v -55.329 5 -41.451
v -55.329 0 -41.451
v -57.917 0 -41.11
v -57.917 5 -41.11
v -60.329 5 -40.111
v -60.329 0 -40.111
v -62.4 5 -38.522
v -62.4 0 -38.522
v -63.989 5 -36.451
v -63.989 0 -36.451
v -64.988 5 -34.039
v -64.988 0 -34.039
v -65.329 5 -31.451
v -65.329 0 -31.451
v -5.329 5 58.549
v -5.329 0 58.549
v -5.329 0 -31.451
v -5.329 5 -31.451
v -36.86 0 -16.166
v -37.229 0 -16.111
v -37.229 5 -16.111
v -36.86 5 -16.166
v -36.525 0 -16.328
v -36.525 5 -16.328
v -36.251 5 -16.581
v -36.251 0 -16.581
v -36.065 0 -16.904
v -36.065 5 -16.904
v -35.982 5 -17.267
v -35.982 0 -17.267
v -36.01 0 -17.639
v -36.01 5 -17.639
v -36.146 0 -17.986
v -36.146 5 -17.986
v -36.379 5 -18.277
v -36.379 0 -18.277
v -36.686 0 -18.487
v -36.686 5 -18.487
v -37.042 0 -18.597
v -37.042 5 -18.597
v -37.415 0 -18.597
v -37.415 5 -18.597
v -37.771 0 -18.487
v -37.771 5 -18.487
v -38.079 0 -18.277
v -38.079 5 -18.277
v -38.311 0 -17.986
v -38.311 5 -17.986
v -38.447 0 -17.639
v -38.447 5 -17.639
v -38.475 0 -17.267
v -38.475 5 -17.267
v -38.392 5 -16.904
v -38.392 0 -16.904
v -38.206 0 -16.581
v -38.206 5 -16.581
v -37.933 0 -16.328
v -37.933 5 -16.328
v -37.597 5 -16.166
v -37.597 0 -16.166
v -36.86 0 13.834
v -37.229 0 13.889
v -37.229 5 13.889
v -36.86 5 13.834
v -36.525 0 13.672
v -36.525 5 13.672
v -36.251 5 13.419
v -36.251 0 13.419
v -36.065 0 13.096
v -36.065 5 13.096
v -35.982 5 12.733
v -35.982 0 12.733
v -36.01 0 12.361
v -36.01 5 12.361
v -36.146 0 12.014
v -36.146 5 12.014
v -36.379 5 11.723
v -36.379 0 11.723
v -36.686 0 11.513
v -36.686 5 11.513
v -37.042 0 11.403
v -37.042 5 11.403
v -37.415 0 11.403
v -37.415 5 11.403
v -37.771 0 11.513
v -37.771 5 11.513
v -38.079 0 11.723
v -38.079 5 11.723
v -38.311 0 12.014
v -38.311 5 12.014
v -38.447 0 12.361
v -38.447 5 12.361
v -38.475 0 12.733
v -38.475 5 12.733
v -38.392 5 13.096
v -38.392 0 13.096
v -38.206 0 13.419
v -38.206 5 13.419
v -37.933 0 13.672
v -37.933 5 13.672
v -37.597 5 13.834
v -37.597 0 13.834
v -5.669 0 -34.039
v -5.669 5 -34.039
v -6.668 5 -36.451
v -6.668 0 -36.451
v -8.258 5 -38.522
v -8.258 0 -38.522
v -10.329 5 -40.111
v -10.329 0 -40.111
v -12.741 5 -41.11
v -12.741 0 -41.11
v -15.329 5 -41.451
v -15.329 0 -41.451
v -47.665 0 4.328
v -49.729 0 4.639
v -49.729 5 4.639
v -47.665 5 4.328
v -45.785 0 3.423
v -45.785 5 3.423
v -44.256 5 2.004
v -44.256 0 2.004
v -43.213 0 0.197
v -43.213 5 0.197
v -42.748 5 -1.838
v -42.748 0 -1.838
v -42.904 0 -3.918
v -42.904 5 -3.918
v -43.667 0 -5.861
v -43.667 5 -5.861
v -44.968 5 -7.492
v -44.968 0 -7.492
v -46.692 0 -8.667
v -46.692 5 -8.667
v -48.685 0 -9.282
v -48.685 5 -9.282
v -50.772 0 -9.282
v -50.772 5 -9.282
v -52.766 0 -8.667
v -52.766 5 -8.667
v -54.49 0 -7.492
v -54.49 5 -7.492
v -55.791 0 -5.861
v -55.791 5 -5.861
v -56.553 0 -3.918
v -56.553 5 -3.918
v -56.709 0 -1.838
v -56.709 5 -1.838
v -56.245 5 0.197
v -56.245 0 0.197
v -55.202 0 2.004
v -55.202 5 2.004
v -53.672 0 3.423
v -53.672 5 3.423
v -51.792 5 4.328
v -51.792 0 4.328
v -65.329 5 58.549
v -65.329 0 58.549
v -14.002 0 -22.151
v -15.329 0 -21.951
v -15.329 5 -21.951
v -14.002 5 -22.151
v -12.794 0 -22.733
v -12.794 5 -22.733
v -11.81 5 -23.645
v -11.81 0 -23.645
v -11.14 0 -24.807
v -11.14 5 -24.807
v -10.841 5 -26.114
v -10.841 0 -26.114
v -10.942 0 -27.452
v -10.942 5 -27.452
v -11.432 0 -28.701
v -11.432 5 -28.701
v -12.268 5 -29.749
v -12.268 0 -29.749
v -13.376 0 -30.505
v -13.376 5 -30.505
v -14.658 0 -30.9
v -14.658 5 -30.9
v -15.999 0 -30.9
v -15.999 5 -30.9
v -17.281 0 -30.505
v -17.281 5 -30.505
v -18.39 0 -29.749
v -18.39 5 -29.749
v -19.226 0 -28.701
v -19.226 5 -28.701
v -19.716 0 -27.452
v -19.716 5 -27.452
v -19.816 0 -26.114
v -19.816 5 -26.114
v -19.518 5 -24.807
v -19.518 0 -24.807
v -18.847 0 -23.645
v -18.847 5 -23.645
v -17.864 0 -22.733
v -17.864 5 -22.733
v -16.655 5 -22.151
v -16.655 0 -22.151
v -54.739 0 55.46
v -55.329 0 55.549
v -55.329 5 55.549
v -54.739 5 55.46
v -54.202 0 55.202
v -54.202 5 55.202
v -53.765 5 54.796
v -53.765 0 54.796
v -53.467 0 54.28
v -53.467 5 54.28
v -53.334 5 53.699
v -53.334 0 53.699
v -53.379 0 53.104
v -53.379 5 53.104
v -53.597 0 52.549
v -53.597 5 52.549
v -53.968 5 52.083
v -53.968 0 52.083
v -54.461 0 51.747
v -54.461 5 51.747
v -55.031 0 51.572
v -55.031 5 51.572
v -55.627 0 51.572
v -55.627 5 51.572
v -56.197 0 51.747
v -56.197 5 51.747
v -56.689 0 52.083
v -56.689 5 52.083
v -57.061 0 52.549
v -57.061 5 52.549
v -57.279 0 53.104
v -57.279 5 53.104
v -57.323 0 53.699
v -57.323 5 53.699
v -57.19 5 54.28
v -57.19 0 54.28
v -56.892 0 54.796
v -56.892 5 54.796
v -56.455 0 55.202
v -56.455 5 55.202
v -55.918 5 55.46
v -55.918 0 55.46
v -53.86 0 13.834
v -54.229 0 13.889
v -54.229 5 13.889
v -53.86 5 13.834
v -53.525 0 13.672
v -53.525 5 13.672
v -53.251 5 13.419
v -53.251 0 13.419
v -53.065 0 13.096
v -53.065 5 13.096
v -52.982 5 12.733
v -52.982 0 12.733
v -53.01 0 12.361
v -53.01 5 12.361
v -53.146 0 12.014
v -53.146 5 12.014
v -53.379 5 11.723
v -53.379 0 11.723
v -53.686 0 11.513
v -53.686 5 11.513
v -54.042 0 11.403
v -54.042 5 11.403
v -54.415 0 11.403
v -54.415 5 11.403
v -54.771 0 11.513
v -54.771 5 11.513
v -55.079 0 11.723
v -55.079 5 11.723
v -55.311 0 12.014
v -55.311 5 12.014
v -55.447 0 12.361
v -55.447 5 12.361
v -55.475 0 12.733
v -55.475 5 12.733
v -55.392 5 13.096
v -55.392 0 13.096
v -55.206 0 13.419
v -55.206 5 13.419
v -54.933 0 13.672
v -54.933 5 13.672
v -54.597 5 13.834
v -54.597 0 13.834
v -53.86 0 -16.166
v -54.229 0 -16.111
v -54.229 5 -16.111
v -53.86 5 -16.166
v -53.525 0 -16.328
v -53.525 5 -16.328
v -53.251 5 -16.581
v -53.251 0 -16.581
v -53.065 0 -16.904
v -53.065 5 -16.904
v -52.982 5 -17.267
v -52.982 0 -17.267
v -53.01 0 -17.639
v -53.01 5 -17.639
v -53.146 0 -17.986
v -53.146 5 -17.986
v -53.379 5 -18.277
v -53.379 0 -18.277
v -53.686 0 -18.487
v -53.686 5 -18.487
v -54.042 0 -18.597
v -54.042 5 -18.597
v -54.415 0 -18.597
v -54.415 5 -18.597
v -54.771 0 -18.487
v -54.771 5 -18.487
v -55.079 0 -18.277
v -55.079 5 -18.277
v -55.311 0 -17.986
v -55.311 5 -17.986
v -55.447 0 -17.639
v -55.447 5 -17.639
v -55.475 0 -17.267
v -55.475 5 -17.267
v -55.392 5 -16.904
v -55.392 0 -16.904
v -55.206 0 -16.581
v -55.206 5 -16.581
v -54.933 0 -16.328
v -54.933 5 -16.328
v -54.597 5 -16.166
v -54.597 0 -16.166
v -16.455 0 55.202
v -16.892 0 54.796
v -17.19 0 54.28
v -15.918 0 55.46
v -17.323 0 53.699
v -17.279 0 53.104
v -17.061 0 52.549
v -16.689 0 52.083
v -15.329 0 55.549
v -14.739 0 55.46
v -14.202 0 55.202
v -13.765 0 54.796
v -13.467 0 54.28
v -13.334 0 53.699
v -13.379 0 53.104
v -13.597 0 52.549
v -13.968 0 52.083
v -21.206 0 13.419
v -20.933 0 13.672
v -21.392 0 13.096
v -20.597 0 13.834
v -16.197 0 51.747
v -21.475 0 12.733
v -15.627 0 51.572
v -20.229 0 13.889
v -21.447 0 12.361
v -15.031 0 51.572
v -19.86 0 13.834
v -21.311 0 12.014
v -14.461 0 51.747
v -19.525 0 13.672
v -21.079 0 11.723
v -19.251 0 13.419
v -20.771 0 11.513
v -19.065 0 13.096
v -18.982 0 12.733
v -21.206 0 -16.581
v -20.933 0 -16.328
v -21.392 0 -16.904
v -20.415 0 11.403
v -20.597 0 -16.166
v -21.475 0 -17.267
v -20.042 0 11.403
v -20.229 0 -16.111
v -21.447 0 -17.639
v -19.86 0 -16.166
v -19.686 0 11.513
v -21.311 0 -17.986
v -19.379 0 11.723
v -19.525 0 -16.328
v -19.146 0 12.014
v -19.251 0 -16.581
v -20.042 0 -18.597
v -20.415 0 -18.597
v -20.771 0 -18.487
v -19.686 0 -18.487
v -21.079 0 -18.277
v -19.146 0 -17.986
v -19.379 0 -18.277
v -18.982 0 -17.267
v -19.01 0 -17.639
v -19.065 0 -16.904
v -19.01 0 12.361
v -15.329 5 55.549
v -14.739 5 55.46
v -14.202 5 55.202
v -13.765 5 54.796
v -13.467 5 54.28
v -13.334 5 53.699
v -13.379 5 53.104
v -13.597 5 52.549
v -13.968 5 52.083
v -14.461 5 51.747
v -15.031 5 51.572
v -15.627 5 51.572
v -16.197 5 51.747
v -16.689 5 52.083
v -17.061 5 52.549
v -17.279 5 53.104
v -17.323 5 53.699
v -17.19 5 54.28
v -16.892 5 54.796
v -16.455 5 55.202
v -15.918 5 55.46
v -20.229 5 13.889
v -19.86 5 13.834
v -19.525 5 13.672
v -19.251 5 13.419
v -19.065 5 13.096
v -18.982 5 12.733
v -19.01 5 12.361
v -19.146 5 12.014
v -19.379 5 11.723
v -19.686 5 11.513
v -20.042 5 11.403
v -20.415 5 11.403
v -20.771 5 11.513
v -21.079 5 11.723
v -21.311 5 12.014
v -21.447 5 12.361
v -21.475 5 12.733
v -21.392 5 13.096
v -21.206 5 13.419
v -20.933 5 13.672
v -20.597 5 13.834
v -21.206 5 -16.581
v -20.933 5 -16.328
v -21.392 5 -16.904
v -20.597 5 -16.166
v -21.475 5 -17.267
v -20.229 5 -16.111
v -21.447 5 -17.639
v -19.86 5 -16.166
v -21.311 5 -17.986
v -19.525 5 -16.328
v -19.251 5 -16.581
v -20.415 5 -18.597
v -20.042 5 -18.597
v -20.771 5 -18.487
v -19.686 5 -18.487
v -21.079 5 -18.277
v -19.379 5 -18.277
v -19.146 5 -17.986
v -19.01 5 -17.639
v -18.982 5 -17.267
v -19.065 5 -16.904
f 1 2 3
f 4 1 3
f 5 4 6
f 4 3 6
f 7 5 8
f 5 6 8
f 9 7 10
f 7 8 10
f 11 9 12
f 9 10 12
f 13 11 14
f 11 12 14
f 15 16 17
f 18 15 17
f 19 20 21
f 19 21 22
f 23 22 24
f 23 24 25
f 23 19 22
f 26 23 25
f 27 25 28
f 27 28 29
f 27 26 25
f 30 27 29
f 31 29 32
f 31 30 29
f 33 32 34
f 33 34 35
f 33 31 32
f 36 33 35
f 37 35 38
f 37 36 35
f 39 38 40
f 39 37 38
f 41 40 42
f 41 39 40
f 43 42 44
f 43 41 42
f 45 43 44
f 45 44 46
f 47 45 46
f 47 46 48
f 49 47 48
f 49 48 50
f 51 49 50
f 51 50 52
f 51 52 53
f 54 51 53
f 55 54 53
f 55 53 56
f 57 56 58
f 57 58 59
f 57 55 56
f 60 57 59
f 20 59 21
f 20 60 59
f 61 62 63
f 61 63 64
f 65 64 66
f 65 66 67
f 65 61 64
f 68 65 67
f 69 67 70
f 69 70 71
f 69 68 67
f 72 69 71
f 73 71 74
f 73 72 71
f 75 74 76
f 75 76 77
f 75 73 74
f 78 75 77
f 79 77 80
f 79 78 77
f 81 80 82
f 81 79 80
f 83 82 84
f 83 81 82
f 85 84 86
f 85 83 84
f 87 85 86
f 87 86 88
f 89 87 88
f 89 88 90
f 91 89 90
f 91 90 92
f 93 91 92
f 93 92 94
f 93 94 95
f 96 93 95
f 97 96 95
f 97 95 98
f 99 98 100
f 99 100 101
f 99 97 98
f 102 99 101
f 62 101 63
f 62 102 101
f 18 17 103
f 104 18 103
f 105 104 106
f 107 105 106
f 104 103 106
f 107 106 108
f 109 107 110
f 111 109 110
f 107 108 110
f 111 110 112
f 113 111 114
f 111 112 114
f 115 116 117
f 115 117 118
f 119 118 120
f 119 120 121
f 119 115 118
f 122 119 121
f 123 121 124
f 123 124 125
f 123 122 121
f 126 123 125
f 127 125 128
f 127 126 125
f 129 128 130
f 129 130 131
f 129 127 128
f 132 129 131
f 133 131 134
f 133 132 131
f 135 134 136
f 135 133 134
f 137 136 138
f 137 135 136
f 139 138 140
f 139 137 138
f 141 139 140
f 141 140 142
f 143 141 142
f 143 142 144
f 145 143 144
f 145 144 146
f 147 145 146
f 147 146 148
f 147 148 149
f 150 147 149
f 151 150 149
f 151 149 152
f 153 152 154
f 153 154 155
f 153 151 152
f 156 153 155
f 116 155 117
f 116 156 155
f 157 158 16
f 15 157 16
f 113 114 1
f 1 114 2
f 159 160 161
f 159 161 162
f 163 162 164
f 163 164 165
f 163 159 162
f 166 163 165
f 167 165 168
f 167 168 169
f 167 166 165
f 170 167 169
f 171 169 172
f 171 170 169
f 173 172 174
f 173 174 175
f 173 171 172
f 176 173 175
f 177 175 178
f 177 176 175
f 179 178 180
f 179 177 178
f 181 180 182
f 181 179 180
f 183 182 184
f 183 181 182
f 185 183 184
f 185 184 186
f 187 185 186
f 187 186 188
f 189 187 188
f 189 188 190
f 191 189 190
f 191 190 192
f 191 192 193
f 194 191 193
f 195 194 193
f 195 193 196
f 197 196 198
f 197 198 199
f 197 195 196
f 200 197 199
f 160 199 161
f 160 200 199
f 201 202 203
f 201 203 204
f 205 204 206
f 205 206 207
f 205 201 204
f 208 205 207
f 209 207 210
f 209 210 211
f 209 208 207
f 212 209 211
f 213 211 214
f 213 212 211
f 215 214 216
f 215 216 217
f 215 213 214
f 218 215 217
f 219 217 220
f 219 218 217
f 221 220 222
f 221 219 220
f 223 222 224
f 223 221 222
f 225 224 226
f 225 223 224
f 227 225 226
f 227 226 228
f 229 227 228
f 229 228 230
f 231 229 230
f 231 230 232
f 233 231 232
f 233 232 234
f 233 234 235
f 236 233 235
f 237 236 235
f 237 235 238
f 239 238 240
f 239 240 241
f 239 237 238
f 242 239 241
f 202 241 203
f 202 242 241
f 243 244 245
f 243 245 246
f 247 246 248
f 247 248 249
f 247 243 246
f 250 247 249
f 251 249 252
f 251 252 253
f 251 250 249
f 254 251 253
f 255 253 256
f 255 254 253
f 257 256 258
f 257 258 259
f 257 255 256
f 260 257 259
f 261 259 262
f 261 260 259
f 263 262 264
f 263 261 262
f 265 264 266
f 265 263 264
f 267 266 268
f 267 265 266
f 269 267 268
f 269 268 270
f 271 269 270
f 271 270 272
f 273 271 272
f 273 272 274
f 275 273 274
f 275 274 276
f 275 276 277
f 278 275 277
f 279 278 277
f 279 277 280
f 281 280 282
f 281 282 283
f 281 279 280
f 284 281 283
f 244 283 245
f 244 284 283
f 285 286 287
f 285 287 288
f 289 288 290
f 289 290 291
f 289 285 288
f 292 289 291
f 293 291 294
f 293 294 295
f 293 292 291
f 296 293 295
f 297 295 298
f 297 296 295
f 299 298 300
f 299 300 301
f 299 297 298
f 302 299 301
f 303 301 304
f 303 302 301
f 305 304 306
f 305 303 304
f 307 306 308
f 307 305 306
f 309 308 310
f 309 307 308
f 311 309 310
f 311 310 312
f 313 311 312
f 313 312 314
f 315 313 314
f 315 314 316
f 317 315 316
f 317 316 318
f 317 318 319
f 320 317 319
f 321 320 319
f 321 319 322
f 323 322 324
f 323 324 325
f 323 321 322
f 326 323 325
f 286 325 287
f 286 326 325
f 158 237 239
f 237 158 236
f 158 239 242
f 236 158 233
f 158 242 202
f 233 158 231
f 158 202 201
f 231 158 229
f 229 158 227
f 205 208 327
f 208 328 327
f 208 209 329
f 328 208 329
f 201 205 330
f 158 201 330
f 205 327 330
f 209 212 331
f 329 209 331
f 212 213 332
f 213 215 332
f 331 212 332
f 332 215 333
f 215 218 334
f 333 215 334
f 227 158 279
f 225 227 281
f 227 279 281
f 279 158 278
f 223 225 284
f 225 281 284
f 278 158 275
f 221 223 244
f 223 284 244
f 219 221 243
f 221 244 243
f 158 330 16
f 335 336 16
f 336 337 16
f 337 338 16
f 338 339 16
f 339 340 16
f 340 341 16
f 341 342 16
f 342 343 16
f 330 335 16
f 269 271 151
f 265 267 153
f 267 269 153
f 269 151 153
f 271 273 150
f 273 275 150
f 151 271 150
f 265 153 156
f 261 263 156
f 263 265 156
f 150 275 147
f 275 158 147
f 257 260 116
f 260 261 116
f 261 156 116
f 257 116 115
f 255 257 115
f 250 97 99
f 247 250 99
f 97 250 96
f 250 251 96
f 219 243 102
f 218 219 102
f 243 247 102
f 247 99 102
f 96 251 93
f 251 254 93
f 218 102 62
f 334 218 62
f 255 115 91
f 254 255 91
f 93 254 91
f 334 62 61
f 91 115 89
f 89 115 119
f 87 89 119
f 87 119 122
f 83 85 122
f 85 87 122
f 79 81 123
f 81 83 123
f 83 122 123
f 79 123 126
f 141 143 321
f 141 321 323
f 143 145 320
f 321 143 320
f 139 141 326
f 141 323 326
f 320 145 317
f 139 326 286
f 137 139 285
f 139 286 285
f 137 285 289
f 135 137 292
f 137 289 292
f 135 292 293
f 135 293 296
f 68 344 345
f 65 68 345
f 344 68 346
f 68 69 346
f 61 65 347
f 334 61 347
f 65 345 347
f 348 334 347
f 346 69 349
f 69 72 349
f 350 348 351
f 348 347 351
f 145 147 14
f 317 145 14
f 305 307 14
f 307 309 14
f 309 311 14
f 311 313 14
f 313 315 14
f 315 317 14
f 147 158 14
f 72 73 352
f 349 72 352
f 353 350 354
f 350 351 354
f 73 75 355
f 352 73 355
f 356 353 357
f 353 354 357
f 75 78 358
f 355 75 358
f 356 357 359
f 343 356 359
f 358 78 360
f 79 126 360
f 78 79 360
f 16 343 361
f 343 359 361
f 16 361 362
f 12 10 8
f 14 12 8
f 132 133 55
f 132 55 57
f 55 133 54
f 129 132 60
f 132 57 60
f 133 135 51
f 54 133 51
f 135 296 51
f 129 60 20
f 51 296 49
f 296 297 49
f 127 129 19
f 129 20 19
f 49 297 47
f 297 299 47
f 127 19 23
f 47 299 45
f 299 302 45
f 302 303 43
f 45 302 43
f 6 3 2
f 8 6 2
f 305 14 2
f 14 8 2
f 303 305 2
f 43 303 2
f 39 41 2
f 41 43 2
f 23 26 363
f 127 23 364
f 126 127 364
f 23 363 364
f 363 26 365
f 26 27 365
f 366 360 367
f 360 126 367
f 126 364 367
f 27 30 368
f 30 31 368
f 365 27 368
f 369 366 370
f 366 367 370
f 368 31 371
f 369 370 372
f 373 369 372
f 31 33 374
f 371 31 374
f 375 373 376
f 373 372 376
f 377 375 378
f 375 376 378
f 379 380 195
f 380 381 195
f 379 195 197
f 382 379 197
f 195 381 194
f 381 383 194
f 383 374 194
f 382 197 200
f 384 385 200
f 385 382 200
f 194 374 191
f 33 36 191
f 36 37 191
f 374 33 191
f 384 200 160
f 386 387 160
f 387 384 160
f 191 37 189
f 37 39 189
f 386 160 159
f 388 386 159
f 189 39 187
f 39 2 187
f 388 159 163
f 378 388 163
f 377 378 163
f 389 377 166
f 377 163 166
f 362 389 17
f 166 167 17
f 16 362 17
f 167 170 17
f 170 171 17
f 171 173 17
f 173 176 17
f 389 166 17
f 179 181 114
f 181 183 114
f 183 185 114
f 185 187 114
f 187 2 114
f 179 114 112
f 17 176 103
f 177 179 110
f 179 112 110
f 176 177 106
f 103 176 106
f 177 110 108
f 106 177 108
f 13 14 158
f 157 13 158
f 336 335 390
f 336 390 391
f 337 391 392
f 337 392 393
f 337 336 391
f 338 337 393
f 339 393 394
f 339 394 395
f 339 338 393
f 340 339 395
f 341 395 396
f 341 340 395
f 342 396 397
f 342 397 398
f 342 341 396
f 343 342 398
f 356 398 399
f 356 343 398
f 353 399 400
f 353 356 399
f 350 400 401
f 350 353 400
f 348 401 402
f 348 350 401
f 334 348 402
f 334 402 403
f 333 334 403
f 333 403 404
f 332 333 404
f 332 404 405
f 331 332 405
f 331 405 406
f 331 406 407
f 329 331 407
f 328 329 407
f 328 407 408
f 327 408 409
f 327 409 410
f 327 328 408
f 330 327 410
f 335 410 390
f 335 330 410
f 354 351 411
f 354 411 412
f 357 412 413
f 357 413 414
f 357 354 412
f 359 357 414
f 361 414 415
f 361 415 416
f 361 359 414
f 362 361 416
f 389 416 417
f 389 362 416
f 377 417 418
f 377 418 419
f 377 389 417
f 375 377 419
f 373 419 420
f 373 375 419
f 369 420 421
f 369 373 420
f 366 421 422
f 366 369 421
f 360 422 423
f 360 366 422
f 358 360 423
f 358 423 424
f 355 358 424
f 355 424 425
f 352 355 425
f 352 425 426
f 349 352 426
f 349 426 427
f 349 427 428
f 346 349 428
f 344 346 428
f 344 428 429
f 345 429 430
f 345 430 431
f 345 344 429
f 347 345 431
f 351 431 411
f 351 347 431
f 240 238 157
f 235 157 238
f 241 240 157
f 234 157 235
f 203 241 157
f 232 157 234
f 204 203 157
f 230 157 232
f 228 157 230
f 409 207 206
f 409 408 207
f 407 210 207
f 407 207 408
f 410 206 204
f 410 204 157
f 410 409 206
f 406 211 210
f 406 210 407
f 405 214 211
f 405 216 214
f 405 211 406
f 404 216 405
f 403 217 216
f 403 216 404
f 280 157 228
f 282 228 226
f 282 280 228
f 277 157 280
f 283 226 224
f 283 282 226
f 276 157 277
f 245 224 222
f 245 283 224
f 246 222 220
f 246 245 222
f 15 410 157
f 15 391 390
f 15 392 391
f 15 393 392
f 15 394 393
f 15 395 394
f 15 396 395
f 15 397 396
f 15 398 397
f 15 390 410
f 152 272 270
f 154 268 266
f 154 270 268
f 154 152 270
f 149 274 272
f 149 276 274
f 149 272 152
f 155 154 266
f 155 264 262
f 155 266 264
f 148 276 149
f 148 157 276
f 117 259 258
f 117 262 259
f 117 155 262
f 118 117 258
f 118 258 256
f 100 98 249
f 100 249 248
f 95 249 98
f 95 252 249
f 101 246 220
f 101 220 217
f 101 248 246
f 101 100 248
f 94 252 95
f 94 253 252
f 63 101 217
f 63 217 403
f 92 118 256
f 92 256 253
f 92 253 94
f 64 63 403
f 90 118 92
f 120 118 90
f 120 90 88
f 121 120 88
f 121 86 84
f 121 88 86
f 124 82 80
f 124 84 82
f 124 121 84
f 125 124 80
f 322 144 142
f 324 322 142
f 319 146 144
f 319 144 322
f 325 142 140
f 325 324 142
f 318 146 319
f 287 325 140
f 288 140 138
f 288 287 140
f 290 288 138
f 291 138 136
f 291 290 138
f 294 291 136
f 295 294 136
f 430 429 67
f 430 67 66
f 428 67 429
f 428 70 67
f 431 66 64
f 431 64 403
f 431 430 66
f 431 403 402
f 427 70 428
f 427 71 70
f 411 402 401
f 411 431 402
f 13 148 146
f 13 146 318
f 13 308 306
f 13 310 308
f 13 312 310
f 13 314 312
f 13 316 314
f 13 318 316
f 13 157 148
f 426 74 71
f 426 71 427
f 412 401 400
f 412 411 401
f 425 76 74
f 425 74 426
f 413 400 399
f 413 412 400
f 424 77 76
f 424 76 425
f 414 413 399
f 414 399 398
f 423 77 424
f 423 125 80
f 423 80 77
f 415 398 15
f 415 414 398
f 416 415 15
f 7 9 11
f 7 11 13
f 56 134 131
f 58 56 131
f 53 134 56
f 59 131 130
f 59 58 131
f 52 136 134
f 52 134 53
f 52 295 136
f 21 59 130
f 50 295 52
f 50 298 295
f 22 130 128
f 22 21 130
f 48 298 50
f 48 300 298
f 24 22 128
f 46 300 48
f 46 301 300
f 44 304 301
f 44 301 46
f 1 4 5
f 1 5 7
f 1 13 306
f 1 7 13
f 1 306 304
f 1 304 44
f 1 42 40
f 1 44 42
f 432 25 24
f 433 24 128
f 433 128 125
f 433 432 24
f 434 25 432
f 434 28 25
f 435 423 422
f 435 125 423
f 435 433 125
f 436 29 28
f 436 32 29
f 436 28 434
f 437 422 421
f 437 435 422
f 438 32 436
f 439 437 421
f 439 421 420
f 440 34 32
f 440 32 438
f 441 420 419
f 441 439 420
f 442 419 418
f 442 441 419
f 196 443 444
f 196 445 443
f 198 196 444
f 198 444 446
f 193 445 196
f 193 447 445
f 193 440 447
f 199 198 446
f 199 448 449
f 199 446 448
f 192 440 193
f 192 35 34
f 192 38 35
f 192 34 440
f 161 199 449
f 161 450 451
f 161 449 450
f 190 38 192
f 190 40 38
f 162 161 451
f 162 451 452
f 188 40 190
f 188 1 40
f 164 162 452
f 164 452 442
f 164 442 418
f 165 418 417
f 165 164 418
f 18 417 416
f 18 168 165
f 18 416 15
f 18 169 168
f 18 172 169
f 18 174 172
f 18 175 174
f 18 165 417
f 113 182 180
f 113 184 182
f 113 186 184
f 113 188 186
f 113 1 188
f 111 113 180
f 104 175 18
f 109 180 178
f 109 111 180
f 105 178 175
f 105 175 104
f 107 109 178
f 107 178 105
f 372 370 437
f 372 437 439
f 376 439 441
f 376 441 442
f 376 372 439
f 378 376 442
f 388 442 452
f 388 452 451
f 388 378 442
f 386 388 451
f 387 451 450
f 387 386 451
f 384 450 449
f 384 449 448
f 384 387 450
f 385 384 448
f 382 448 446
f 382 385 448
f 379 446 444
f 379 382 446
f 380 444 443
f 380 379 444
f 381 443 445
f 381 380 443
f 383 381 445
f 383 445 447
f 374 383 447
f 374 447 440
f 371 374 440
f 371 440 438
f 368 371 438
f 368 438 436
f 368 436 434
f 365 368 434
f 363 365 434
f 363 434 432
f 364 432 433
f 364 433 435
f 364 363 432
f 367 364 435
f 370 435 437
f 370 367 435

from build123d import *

# Parameters (mm, degrees)
SKETCH_1_R      = 7
SKETCH_1_R_2    = 2
SKETCH_1_R_3    = 4.5
SKETCH_1_R_4    = 1.25
EXTRUDE_1_DEPTH = 5


with BuildPart() as part:
    # 草图1 → 凸台-拉伸1 (new body)
    with BuildSketch(Plane(origin=(0, 0, 0), x_dir=(1, 0, 0), z_dir=(0, 1, 0))):
        with BuildLine():
            Line((-65.328738569, 31.45065883), (-65.328738569, -58.54934117))
            Line((-65.328738569, -58.54934117), (-55.328738569, -58.54934117))
            Line((-55.328738569, -58.54934117), (-15.328738569, -58.54934117))
            Line((-15.328738569, -58.54934117), (-5.328738569, -58.54934117))
            Line((-5.328738569, -58.54934117), (-5.328738569, 2.36065883))
            Line((-5.328738569, 2.36065883), (-5.328738569, 31.45065883))
            ThreePointArc((-5.328738569, 31.45065883), (-8.257670757, 38.521726641), (-15.328738569, 41.45065883))
            Line((-15.328738569, 41.45065883), (-55.328738569, 41.45065883))
            ThreePointArc((-55.328738569, 41.45065883), (-62.399806381, 38.521726641), (-65.328738569, 31.45065883))
        make_face()
        with Locations(Location((-49.728738569, 2.36065883, 0), (0, 0, 270))):
            Circle(SKETCH_1_R, mode=Mode.SUBTRACT)
        with Locations(Location((-55.328738569, -53.54934117, 0), (0, 0, 270))):
            Circle(SKETCH_1_R_2, mode=Mode.SUBTRACT)
        with Locations(Location((-15.328738569, -53.54934117, 0), (0, 0, 270))):
            Circle(SKETCH_1_R_2, mode=Mode.SUBTRACT)
        with Locations(Location((-15.328738569, 26.45065883, 0), (0, 0, 270))):
            Circle(SKETCH_1_R_3, mode=Mode.SUBTRACT)
        with Locations(Location((-54.228738569, 17.36065883, 0), (0, 0, 270))):
            Circle(SKETCH_1_R_4, mode=Mode.SUBTRACT)
        with Locations(Location((-37.228738569, 17.36065883, 0), (0, 0, 270))):
            Circle(SKETCH_1_R_4, mode=Mode.SUBTRACT)
        with Locations(Location((-20.228738569, 17.36065883, 0), (0, 0, 270))):
            Circle(SKETCH_1_R_4, mode=Mode.SUBTRACT)
        with Locations(Location((-54.228738569, -12.63934117, 0), (0, 0, 270))):
            Circle(SKETCH_1_R_4, mode=Mode.SUBTRACT)
        with Locations(Location((-37.228738569, -12.63934117, 0), (0, 0, 270))):
            Circle(SKETCH_1_R_4, mode=Mode.SUBTRACT)
        with Locations(Location((-20.228738569, -12.63934117, 0), (0, 0, 270))):
            Circle(SKETCH_1_R_4, mode=Mode.SUBTRACT)
    extrude(amount=EXTRUDE_1_DEPTH)


solid = part.part
